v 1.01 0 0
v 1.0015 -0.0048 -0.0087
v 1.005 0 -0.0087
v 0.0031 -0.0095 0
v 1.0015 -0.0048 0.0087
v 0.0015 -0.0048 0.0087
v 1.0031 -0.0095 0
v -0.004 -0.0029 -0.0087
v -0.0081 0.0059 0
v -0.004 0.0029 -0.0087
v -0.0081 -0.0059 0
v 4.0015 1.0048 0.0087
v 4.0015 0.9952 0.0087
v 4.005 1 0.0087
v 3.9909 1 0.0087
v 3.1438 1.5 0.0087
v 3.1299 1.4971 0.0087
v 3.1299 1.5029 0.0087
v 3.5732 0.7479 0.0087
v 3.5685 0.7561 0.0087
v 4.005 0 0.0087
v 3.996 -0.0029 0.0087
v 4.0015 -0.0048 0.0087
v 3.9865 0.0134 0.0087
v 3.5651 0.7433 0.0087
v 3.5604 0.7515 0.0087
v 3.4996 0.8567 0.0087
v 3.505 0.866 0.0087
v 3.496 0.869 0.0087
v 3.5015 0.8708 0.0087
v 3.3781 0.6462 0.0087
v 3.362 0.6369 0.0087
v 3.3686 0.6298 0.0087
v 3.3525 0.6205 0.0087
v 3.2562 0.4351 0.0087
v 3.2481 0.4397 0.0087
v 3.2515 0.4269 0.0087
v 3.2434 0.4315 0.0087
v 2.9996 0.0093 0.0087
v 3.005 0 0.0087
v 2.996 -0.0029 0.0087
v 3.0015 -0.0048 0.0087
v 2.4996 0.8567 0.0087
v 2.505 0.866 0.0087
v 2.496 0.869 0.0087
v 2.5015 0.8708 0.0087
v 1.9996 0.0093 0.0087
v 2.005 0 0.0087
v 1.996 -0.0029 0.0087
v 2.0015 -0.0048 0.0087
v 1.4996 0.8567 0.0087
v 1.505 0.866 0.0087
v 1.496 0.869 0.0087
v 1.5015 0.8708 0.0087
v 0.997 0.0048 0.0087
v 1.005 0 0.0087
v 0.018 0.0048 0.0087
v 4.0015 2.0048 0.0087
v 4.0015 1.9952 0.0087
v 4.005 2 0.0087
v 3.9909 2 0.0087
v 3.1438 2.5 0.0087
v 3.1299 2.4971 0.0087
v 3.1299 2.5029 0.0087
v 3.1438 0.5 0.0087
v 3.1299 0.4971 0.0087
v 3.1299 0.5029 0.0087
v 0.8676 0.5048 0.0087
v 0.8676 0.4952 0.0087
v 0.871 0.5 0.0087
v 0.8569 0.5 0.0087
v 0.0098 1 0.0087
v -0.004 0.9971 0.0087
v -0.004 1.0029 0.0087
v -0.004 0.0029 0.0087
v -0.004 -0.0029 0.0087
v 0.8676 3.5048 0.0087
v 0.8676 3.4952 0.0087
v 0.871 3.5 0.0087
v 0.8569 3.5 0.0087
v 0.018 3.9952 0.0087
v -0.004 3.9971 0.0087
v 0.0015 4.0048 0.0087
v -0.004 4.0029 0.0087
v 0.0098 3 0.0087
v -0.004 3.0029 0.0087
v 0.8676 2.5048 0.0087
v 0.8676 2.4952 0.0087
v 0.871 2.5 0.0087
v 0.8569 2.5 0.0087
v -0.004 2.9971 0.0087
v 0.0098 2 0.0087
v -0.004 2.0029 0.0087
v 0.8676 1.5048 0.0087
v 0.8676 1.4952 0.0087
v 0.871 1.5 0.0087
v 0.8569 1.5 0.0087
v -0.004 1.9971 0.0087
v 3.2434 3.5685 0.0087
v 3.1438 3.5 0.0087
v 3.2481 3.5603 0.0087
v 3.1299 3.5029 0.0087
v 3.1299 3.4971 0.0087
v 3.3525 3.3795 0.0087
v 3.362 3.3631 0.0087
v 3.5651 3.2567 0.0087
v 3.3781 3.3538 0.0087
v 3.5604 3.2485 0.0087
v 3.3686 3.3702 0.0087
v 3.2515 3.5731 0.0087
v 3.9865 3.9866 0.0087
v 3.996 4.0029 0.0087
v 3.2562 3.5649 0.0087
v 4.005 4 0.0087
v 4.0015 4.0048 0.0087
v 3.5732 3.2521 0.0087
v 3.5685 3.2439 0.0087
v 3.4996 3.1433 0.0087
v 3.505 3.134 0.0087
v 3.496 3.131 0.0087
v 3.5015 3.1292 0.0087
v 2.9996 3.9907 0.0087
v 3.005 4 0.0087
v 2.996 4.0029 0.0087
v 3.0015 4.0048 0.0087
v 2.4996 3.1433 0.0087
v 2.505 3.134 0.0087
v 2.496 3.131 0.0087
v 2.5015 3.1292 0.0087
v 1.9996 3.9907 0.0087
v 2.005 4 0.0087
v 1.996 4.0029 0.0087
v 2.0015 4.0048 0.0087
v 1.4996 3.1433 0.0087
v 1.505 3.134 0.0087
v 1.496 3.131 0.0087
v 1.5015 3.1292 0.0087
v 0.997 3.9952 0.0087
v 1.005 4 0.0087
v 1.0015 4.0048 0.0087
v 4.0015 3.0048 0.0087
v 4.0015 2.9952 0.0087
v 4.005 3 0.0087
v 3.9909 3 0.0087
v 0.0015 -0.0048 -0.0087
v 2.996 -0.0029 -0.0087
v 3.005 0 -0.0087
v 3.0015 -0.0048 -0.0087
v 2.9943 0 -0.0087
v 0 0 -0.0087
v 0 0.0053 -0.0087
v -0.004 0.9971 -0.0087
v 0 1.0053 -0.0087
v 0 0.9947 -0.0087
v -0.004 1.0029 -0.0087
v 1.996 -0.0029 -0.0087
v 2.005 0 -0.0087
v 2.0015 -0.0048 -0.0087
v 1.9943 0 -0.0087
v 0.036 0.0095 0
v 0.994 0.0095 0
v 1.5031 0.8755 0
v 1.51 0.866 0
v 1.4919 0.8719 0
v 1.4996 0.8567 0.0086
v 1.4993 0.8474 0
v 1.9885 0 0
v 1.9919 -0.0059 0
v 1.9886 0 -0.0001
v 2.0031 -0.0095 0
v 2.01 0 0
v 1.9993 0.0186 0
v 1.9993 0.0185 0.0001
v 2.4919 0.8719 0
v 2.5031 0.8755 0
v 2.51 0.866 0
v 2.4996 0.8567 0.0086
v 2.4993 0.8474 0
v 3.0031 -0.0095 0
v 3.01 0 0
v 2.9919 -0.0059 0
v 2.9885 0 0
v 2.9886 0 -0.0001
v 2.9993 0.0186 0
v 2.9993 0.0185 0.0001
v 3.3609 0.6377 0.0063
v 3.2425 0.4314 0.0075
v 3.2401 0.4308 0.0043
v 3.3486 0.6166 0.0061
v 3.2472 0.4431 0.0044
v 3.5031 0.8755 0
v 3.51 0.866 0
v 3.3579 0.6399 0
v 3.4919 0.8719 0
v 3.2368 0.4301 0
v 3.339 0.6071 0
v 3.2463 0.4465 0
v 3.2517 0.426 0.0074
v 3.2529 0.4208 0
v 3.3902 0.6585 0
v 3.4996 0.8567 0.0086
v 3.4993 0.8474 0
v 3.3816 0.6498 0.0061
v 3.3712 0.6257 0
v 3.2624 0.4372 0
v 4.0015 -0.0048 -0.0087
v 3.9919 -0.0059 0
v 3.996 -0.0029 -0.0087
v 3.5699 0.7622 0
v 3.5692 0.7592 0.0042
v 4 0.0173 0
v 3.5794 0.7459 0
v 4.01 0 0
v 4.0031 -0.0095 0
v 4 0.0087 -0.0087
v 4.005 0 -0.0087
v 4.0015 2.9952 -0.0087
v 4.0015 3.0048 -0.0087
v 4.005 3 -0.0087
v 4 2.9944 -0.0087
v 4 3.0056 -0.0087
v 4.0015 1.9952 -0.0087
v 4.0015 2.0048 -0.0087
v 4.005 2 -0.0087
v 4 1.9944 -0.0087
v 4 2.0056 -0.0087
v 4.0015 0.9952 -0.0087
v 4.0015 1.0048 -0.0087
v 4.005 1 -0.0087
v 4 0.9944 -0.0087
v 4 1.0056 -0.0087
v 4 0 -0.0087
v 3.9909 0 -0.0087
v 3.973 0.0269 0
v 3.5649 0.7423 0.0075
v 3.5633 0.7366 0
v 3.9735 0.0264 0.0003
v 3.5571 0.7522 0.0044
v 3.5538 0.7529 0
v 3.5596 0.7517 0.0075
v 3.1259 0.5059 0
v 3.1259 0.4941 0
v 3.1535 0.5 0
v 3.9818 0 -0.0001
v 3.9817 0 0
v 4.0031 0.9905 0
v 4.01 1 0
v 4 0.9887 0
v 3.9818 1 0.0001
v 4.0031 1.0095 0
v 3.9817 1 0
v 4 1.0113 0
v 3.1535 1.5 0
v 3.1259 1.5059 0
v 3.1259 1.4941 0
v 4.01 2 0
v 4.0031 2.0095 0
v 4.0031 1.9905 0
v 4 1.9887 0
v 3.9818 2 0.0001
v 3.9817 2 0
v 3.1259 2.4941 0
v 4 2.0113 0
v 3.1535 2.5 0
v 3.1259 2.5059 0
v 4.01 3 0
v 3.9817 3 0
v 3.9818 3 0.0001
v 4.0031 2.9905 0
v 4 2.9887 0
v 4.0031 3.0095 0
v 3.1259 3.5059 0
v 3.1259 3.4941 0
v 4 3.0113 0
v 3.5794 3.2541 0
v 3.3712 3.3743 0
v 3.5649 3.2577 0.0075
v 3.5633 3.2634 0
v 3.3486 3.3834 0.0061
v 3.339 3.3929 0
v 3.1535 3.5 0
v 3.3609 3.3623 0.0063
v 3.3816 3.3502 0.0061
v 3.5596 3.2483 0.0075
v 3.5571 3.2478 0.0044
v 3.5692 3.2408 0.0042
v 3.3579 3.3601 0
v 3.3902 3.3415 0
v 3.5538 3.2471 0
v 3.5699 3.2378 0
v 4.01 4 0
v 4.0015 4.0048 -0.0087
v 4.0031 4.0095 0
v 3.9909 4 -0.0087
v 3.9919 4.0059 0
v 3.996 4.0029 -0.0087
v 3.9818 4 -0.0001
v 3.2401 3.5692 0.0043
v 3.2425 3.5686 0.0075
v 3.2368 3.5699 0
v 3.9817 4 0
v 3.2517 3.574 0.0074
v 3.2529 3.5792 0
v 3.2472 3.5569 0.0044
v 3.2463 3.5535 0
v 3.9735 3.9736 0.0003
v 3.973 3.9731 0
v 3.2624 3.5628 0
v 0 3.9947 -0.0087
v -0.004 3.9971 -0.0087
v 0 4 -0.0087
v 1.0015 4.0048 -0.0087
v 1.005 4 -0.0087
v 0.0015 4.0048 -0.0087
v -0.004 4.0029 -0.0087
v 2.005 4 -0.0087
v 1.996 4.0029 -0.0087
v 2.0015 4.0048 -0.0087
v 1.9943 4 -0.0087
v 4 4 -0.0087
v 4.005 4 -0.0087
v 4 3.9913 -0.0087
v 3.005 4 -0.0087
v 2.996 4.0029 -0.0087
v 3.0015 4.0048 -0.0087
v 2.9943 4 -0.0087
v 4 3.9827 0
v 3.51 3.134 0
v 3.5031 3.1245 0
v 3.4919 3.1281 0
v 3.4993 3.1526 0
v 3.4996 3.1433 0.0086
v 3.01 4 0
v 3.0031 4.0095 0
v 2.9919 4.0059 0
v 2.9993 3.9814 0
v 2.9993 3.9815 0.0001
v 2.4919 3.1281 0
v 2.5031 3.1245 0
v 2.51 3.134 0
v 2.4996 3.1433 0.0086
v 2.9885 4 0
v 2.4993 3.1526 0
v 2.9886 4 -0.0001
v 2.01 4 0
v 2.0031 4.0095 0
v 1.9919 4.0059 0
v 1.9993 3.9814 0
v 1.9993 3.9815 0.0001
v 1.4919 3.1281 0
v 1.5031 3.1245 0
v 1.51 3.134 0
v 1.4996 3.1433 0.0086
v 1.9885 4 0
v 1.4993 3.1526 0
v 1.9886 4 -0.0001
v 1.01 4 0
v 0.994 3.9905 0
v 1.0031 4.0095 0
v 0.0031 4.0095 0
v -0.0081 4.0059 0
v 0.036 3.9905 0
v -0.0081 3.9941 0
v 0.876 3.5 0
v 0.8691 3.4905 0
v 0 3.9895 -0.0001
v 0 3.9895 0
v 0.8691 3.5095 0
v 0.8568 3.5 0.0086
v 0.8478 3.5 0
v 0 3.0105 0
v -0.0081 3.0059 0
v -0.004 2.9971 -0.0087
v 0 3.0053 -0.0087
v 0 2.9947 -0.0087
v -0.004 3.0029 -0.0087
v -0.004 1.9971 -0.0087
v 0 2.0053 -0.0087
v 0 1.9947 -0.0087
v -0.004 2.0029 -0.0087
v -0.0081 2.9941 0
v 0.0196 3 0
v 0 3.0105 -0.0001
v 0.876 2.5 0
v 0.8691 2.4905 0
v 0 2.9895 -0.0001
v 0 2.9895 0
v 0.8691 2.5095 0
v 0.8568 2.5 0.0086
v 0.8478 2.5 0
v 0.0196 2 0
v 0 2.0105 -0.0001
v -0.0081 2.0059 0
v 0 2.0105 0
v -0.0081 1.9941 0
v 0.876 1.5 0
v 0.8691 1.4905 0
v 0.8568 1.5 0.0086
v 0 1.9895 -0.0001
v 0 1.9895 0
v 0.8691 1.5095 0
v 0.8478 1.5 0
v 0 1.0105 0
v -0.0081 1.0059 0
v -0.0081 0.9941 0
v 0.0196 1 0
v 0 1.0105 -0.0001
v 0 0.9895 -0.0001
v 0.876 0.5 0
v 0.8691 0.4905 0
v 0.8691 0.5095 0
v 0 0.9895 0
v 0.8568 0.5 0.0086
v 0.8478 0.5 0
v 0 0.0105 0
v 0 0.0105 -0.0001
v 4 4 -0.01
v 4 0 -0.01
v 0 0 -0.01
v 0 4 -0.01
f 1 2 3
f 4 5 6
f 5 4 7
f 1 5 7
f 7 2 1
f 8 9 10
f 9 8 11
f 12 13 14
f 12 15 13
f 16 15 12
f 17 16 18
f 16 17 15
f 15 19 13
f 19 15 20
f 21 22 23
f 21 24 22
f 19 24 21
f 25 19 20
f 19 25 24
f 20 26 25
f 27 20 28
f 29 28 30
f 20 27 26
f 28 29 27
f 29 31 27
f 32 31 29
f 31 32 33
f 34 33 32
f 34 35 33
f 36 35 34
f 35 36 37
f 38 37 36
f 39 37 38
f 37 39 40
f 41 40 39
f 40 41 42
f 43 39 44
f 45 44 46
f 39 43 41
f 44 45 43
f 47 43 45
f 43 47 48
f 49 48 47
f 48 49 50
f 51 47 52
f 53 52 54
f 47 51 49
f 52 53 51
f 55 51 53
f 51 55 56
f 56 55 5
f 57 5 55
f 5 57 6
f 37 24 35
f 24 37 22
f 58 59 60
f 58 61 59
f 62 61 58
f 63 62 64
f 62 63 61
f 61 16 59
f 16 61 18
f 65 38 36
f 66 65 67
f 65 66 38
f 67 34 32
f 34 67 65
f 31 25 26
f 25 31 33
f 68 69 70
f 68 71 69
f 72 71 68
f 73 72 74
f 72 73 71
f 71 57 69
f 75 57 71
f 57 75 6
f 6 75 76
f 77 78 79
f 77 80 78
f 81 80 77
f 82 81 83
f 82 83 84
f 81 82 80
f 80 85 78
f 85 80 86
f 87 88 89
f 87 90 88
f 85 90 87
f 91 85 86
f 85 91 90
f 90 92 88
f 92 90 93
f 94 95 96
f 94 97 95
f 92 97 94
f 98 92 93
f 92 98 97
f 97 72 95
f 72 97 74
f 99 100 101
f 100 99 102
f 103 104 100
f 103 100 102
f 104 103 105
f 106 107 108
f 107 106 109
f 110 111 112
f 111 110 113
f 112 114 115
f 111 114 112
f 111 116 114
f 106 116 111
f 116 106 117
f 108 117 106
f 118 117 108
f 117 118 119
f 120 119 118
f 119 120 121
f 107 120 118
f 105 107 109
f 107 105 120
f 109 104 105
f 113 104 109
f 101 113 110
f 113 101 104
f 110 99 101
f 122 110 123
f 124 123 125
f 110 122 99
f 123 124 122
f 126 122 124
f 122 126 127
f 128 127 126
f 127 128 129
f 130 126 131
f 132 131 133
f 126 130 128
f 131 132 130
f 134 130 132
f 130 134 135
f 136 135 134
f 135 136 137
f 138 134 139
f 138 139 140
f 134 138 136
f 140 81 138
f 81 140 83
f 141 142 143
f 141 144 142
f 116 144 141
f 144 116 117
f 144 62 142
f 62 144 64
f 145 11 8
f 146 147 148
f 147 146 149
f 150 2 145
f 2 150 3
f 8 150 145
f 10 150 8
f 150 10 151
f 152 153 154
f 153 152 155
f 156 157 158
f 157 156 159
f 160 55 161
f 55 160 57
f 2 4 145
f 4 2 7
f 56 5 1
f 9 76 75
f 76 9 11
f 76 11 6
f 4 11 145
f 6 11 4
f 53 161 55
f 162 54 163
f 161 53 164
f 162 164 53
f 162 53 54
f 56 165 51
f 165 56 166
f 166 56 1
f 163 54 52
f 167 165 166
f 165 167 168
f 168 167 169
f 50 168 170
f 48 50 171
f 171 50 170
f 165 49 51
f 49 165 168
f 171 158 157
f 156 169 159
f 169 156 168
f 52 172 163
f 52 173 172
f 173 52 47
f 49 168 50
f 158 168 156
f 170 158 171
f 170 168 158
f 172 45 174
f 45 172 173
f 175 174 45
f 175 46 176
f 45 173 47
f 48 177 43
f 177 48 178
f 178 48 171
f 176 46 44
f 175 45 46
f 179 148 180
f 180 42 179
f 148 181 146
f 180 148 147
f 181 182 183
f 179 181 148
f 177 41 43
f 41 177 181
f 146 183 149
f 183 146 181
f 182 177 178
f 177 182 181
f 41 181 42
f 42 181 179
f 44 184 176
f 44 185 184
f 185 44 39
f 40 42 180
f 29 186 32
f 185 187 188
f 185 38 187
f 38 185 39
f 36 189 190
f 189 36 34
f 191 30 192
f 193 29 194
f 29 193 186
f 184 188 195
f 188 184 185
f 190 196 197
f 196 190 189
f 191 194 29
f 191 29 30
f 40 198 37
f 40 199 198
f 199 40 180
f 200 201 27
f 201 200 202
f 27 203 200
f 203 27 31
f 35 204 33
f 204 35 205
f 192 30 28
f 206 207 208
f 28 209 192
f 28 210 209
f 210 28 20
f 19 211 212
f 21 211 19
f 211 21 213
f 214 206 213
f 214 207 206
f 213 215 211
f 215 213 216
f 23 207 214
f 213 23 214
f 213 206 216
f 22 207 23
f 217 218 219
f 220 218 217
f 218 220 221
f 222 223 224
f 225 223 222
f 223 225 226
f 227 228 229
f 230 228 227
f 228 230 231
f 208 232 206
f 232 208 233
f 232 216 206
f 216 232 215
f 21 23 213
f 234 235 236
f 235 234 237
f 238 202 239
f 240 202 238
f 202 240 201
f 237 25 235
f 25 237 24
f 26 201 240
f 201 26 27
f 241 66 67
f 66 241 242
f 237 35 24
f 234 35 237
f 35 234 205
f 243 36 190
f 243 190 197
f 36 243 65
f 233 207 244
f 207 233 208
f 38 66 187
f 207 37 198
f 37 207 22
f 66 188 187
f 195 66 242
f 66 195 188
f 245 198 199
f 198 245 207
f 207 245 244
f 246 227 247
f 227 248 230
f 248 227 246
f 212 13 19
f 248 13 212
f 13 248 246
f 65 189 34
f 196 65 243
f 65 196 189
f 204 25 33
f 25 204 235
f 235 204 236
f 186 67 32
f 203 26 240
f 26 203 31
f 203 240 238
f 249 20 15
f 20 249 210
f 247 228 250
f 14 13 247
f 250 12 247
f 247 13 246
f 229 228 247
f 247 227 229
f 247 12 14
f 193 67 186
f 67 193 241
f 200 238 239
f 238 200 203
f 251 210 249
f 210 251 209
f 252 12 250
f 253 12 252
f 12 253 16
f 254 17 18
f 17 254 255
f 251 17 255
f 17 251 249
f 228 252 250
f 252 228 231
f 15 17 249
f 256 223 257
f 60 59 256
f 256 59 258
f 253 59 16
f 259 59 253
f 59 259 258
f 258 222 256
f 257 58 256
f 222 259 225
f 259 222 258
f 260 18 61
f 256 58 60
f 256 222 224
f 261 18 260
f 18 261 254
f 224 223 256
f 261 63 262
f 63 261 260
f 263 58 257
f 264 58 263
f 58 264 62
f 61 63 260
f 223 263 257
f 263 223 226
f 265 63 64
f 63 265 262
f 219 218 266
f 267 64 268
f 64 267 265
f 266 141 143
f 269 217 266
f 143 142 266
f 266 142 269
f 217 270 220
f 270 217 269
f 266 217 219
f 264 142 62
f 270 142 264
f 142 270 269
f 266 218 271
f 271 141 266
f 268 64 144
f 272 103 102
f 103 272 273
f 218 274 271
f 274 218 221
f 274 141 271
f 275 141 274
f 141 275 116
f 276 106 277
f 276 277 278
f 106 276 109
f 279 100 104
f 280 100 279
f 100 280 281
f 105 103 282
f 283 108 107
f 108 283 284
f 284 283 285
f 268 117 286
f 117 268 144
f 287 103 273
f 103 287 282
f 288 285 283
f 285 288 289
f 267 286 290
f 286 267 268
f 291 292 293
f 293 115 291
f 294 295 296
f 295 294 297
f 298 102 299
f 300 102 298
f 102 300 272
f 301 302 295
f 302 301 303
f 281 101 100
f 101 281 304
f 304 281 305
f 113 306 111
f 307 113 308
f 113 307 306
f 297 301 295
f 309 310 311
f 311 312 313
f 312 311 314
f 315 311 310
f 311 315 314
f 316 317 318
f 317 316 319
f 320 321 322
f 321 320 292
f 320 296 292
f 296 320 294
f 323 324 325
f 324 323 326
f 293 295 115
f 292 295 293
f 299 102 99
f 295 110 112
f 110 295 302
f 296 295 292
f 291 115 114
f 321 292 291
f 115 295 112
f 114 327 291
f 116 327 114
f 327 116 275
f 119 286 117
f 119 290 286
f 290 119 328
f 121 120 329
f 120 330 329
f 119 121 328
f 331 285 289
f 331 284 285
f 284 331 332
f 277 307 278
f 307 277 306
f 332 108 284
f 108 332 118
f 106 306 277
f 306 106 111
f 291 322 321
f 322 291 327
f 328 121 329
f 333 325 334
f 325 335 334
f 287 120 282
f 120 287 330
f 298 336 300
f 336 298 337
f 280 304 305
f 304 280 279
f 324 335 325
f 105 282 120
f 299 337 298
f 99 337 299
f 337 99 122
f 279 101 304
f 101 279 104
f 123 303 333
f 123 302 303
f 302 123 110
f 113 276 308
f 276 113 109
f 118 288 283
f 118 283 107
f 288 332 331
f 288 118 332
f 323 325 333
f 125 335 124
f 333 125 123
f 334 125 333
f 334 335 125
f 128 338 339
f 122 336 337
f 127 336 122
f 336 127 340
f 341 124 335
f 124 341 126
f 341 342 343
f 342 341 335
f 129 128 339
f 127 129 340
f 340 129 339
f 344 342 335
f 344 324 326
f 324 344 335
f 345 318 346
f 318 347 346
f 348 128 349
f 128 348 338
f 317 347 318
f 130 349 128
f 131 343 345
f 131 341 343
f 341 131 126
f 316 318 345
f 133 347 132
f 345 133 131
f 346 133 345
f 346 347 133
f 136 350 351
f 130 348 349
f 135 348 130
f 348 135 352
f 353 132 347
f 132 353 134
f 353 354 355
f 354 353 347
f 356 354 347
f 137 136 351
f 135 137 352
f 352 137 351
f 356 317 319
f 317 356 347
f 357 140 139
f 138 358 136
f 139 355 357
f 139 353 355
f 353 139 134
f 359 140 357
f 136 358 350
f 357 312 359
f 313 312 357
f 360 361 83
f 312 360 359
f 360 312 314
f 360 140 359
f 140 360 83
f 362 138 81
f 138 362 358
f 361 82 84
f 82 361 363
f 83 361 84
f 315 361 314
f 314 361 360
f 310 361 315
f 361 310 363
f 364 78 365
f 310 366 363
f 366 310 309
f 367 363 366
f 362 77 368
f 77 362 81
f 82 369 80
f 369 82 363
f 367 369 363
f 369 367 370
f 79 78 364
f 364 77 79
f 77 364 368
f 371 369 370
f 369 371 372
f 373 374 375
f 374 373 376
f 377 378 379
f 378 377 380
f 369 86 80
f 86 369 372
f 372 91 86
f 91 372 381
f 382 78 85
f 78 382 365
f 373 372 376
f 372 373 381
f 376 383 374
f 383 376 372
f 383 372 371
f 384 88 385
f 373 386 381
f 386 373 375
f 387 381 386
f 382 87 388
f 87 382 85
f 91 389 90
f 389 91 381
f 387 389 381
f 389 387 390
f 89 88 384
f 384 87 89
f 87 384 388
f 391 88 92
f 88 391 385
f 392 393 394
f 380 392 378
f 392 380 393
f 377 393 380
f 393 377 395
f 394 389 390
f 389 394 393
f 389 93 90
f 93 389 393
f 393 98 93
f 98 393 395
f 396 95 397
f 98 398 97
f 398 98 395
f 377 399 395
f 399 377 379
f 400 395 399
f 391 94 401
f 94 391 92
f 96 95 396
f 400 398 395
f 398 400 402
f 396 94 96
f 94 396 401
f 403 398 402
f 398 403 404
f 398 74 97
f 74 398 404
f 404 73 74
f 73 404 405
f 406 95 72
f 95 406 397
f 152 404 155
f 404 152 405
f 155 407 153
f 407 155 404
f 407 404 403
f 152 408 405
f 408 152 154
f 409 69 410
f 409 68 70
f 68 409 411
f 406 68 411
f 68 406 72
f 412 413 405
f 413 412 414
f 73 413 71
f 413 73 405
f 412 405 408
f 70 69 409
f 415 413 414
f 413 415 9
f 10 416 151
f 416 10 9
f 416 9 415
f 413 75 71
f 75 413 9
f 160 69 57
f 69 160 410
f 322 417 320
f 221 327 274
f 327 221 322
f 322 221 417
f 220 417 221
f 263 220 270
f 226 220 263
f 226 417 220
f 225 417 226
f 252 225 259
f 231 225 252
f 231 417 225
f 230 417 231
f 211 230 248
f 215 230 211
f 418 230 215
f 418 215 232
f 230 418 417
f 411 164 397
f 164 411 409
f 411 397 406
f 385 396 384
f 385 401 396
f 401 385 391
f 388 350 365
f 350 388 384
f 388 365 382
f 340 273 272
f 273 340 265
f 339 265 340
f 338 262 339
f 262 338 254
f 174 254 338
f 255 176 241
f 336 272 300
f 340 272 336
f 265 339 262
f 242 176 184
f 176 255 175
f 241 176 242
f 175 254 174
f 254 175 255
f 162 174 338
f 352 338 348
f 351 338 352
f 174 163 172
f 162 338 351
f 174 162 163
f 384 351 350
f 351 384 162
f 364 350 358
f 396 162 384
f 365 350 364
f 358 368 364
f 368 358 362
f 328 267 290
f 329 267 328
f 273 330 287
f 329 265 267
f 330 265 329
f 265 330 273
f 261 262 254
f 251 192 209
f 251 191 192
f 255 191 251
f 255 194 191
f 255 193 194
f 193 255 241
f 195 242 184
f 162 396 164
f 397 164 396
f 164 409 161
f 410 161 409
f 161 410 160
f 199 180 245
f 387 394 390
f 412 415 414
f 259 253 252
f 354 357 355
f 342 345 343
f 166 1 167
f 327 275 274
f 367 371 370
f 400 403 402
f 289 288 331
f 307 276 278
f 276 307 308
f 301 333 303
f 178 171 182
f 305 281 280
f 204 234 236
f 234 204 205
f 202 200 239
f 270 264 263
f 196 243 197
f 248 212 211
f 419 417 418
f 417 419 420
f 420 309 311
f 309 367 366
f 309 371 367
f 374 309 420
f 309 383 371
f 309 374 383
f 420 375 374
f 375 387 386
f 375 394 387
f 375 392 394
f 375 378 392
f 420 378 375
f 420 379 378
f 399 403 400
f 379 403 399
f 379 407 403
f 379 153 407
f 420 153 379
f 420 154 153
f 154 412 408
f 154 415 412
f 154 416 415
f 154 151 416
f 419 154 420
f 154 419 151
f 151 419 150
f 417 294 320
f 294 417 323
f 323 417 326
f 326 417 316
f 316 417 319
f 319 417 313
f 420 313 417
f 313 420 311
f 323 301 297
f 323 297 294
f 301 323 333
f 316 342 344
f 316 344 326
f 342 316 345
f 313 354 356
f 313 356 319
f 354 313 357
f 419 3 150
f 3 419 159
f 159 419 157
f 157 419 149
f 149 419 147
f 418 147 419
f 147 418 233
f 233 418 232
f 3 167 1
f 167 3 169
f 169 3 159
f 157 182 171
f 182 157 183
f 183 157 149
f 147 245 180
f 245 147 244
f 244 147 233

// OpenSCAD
hull(){
    translate([0, 0]) sphere(0.01);
    translate([1, 0]) sphere(0.01);
}
hull(){
    translate([1, 0]) sphere(0.01);
    translate([1.5, 0.8660254038]) sphere(0.01);
}
hull(){
    translate([1.5, 0.8660254038]) sphere(0.01);
    translate([2, 0]) sphere(0.01);
}
hull(){
    translate([2, 0]) sphere(0.01);
    translate([2.5, 0.8660254038]) sphere(0.01);
}
hull(){
    translate([2.5, 0.8660254038]) sphere(0.01);
    translate([3, 0]) sphere(0.01);
}
hull(){
    translate([3, 0]) sphere(0.01);
    translate([3.5, 0.8660254038]) sphere(0.01);
}
hull(){
    translate([3.5, 0.8660254038]) sphere(0.01);
    translate([4, 0]) sphere(0.01);
}
hull(){
    translate([4, 0]) sphere(0.01);
    translate([3.1339745962, 0.5]) sphere(0.01);
}
hull(){
    translate([3.1339745962, 0.5]) sphere(0.01);
    translate([4, 1]) sphere(0.01);
}
hull(){
    translate([4, 1]) sphere(0.01);
    translate([3.1339745962, 1.5]) sphere(0.01);
}
hull(){
    translate([3.1339745962, 1.5]) sphere(0.01);
    translate([4, 2]) sphere(0.01);
}
hull(){
    translate([4, 2]) sphere(0.01);
    translate([3.1339745962, 2.5]) sphere(0.01);
}
hull(){
    translate([3.1339745962, 2.5]) sphere(0.01);
    translate([4, 3]) sphere(0.01);
}
hull(){
    translate([4, 3]) sphere(0.01);
    translate([3.1339745962, 3.5]) sphere(0.01);
}
hull(){
    translate([3.1339745962, 3.5]) sphere(0.01);
    translate([4, 4]) sphere(0.01);
}
hull(){
    translate([4, 4]) sphere(0.01);
    translate([3.5, 3.1339745962]) sphere(0.01);
}
hull(){
    translate([3.5, 3.1339745962]) sphere(0.01);
    translate([3, 4]) sphere(0.01);
}
hull(){
    translate([3, 4]) sphere(0.01);
    translate([2.5, 3.1339745962]) sphere(0.01);
}
hull(){
    translate([2.5, 3.1339745962]) sphere(0.01);
    translate([2, 4]) sphere(0.01);
}
hull(){
    translate([2, 4]) sphere(0.01);
    translate([1.5, 3.1339745962]) sphere(0.01);
}
hull(){
    translate([1.5, 3.1339745962]) sphere(0.01);
    translate([1, 4]) sphere(0.01);
}
hull(){
    translate([1, 4]) sphere(0.01);
    translate([0, 4]) sphere(0.01);
}
hull(){
    translate([0, 4]) sphere(0.01);
    translate([0.8660254038, 3.5]) sphere(0.01);
}
hull(){
    translate([0.8660254038, 3.5]) sphere(0.01);
    translate([0, 3]) sphere(0.01);
}
hull(){
    translate([0, 3]) sphere(0.01);
    translate([0.8660254038, 2.5]) sphere(0.01);
}
hull(){
    translate([0.8660254038, 2.5]) sphere(0.01);
    translate([0, 2]) sphere(0.01);
}
hull(){
    translate([0, 2]) sphere(0.01);
    translate([0.8660254038, 1.5]) sphere(0.01);
}
hull(){
    translate([0.8660254038, 1.5]) sphere(0.01);
    translate([0, 1]) sphere(0.01);
}
hull(){
    translate([0, 1]) sphere(0.01);
    translate([0.8660254038, 0.5]) sphere(0.01);
}
hull(){
    translate([0.8660254038, 0.5]) sphere(0.01);
    translate([0, 0]) sphere(0.01);
}
translate([0,0,-0.01]) color([0.1,0.1,0.1]) cube([4,4,0.01]);
